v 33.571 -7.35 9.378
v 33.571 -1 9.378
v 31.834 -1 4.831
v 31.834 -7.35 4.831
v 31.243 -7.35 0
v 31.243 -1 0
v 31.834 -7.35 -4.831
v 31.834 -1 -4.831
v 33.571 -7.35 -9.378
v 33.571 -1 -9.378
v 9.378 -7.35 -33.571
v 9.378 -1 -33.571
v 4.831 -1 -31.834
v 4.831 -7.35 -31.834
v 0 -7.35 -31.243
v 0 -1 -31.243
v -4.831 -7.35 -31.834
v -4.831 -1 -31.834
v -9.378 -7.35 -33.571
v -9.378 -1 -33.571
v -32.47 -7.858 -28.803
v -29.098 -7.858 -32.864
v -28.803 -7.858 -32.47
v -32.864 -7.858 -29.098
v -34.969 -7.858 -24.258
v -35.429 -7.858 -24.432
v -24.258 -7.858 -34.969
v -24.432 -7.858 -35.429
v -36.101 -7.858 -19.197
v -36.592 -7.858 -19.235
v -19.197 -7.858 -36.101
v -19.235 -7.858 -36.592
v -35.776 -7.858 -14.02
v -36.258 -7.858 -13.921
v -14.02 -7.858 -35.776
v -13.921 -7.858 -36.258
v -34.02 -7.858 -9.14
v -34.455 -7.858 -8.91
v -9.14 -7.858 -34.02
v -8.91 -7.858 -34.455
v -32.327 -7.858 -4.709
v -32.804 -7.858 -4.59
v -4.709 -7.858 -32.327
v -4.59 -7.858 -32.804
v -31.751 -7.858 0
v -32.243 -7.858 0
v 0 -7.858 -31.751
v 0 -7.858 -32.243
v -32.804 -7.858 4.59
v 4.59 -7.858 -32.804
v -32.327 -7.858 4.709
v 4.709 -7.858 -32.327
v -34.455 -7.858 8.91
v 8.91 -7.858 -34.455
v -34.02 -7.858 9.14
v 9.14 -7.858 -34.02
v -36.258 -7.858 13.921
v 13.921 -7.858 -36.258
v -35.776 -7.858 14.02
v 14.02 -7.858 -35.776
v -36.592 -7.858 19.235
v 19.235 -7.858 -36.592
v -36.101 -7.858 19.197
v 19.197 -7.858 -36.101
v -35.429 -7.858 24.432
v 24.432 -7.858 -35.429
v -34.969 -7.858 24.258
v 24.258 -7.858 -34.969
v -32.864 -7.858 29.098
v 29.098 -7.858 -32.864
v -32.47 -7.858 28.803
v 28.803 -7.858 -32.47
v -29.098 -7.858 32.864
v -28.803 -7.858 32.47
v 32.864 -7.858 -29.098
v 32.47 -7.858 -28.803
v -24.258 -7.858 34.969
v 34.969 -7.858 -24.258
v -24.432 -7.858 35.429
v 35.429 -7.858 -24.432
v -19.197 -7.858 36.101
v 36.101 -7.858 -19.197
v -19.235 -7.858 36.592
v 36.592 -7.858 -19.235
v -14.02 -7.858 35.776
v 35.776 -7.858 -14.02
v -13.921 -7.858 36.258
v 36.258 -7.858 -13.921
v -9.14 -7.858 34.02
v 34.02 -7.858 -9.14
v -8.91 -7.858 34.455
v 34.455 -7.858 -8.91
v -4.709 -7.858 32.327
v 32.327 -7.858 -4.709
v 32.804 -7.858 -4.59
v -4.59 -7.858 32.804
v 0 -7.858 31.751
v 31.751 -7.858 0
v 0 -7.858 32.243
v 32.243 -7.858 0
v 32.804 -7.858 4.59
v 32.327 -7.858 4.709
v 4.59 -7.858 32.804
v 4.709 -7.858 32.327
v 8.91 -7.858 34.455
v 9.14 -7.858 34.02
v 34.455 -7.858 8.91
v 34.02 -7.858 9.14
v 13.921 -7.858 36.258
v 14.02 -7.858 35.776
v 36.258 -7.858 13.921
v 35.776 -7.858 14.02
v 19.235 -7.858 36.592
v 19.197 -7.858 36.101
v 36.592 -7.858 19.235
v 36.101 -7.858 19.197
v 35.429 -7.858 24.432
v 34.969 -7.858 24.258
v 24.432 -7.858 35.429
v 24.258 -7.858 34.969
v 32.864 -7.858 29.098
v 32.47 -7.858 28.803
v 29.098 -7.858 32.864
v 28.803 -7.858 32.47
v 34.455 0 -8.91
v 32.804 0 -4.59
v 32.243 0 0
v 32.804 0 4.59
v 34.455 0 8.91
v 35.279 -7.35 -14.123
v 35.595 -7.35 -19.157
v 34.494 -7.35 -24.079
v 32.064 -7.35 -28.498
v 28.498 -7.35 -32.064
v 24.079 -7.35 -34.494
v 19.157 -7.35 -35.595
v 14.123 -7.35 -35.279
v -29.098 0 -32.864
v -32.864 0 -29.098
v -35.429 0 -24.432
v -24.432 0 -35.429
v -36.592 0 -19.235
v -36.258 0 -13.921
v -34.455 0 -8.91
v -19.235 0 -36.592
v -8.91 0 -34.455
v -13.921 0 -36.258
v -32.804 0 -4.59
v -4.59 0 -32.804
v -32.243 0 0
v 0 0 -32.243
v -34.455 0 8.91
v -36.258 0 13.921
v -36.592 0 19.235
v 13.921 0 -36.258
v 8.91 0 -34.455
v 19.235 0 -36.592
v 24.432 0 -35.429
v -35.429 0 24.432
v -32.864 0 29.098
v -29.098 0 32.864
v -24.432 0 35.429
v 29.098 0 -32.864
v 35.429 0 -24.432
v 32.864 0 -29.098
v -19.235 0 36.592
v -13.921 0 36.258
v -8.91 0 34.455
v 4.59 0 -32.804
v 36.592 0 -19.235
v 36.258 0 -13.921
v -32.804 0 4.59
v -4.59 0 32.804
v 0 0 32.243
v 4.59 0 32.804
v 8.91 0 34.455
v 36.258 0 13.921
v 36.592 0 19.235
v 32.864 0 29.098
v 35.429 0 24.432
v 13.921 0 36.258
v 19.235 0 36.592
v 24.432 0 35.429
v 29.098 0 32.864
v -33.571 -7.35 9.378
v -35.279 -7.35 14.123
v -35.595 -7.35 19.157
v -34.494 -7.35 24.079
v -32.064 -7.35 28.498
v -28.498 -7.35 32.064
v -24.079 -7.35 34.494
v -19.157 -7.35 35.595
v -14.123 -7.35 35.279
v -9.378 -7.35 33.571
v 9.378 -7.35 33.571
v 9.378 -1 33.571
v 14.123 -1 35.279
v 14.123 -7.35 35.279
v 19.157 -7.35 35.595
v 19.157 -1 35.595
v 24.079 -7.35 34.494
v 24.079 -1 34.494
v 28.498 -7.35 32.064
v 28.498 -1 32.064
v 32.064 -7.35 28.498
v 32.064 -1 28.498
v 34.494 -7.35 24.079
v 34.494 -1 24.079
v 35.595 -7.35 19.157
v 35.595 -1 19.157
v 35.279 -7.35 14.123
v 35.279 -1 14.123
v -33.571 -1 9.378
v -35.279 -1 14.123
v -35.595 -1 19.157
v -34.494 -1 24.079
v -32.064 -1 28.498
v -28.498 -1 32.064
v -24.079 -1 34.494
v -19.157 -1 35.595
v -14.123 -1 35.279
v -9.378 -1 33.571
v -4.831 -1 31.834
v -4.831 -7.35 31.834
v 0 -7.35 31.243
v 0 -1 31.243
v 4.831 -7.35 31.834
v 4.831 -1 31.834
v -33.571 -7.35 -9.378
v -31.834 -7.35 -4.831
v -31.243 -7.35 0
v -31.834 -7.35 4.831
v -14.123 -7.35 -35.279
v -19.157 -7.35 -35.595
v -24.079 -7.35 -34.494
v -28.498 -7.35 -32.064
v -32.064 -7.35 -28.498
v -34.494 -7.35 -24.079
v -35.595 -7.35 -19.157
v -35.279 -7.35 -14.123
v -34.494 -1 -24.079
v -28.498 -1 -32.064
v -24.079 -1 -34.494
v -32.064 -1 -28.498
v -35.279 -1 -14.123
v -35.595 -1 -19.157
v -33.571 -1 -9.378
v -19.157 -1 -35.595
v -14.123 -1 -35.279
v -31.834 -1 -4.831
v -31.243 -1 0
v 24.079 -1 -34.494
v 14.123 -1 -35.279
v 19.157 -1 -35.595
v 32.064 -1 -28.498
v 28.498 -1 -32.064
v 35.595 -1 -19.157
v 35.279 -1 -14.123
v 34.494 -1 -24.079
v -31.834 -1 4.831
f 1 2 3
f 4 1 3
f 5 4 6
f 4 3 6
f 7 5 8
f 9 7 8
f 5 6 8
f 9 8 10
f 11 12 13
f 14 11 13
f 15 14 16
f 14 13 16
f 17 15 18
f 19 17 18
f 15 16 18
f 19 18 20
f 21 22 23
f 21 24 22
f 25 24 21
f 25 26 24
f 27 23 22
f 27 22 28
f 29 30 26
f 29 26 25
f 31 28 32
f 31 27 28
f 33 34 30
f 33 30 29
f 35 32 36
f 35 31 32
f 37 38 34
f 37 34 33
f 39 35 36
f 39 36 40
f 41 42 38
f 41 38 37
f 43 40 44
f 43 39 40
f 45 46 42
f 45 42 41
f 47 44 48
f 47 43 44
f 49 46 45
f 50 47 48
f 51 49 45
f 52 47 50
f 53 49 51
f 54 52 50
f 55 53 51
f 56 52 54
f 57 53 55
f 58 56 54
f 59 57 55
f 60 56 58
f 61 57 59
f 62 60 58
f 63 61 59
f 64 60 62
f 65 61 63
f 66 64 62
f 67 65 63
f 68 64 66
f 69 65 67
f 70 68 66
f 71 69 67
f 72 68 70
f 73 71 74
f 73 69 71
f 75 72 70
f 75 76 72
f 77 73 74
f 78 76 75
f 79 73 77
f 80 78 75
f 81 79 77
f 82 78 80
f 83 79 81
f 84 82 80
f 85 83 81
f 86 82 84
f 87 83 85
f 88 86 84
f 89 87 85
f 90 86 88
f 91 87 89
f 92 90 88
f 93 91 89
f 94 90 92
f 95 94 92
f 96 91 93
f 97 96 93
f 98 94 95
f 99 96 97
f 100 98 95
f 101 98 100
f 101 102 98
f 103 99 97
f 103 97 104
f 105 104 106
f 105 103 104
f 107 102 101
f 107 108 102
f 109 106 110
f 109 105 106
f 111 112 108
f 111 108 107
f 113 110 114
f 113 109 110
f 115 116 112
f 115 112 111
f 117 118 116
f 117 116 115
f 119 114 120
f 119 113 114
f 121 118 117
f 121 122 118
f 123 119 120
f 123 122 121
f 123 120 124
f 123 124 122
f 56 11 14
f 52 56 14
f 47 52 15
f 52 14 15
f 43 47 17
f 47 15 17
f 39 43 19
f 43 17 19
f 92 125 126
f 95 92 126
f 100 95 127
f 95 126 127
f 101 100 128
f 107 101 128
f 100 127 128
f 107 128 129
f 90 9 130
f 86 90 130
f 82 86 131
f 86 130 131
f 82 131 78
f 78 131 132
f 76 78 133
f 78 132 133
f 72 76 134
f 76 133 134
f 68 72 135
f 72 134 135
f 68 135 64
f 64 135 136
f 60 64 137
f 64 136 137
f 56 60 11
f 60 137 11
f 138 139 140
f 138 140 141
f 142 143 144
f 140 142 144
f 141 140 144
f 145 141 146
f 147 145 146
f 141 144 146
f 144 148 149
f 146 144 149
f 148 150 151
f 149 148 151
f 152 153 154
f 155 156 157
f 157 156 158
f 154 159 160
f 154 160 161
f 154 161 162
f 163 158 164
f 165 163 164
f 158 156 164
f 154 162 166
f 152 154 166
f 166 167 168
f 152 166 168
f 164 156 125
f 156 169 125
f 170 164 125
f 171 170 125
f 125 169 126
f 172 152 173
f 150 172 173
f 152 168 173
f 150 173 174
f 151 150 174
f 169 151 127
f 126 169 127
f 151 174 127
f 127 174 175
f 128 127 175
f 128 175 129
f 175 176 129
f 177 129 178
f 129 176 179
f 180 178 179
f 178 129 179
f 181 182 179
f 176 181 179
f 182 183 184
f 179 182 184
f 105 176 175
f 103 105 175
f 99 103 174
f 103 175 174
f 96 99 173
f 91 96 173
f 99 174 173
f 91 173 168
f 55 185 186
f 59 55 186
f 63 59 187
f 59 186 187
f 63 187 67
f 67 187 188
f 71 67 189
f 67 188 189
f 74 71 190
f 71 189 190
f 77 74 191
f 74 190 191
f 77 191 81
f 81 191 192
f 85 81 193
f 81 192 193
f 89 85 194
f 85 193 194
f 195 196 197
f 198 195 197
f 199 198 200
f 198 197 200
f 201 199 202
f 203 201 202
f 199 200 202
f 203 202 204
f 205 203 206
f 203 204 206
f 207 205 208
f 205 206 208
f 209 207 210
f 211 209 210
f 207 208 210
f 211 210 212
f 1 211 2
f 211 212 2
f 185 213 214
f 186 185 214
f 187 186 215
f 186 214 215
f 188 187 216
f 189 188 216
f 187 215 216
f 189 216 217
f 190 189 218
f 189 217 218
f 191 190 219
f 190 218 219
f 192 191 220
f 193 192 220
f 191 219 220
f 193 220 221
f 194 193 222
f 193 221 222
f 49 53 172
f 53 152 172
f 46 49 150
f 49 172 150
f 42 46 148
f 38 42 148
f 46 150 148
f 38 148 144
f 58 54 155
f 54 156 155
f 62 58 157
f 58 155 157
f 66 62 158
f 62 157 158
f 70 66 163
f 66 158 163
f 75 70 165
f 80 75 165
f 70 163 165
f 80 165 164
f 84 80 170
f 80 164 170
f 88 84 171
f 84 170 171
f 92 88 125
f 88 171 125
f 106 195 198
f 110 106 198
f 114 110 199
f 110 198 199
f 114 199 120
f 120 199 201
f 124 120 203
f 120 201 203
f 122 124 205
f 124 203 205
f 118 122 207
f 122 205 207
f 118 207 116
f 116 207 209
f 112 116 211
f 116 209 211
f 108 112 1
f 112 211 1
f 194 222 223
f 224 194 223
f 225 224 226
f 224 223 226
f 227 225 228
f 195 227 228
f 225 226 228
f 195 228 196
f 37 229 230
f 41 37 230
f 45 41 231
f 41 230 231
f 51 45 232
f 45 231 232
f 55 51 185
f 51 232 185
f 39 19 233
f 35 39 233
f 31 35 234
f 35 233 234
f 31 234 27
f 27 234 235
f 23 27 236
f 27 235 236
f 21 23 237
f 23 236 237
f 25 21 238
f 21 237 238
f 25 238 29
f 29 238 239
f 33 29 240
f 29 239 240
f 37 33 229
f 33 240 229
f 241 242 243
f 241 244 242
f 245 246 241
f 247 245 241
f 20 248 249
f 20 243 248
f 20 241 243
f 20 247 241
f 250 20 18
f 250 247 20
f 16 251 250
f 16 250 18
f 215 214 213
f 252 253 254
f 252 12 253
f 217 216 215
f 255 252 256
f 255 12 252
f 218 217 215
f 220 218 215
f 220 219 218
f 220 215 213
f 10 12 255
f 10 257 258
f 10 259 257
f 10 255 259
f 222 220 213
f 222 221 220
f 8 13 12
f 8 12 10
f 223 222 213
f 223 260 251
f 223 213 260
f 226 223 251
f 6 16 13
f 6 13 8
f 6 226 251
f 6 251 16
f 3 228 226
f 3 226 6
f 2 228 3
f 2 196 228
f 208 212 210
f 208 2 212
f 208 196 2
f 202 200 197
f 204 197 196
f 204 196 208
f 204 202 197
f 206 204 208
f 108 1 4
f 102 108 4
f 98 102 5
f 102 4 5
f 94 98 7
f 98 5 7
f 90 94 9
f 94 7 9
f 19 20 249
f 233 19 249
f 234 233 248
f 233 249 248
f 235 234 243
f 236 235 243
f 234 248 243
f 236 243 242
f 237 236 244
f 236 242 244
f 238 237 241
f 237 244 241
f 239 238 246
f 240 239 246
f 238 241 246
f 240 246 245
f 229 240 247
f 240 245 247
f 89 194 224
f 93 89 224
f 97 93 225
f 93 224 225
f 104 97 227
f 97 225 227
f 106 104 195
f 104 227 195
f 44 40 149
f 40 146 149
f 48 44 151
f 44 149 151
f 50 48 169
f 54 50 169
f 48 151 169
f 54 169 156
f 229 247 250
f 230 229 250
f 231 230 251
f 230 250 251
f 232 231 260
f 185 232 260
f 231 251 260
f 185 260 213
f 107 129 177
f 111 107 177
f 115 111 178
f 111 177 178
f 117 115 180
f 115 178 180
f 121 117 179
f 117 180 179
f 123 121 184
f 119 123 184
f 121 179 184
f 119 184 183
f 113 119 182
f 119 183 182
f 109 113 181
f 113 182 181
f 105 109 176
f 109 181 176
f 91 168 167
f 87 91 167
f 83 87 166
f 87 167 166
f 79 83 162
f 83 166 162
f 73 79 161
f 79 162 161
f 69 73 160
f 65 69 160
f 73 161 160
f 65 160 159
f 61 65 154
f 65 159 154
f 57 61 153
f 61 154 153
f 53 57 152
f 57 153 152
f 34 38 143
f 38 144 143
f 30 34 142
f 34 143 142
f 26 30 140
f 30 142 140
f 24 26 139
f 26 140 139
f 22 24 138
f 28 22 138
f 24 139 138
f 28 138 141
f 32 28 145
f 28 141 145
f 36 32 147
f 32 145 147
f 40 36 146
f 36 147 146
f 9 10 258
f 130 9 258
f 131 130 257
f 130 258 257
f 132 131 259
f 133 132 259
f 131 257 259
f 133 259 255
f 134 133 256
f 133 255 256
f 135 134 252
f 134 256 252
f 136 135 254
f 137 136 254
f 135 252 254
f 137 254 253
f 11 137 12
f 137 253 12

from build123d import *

# Parameters (mm, degrees)
F1_DEPTH = 1
F3_DEPTH = 6.858
F4_SIZE  = 0.508


with BuildPart() as f1:
    # F0 (on Front) → F1 (new body)
    with BuildSketch(Plane.XZ):
        with BuildLine():
            ThreePointArc((-8.910079, 34.455263), (-31.114318, 31.114318), (-34.455263, 8.910079))
            ThreePointArc((-34.455263, 8.910079), (-32.243107, 0), (-34.455263, -8.910079))
            ThreePointArc((-34.455263, -8.910079), (-31.114318, -31.114318), (-8.910079, -34.455263))
            ThreePointArc((-8.910079, -34.455263), (0, -32.243107), (8.910079, -34.455263))
            ThreePointArc((8.910079, -34.455263), (31.114318, -31.114318), (34.455263, -8.910079))
            ThreePointArc((34.455263, -8.910079), (32.243107, 0), (34.455263, 8.910079))
            ThreePointArc((34.455263, 8.910079), (31.114318, 31.114318), (8.910079, 34.455263))
            ThreePointArc((8.910079, 34.455263), (0, 32.243107), (-8.910079, 34.455263))
        make_face()
    extrude(amount=F1_DEPTH)

    # F2 (on face) → F3 (join)
    with BuildSketch(Plane.XZ.offset(1)):
        with BuildLine():
            ThreePointArc((-8.910079, 34.455263), (-31.114318, 31.114318), (-34.455263, 8.910079))
            ThreePointArc((-34.455263, 8.910079), (-32.243107, 0), (-34.455263, -8.910079))
            ThreePointArc((-34.455263, -8.910079), (-31.114318, -31.114318), (-8.910079, -34.455263))
            ThreePointArc((-8.910079, -34.455263), (0, -32.243107), (8.910079, -34.455263))
            ThreePointArc((8.910079, -34.455263), (31.114318, -31.114318), (34.455263, -8.910079))
            ThreePointArc((34.455263, -8.910079), (32.243107, 0), (34.455263, 8.910079))
            ThreePointArc((34.455263, 8.910079), (31.114318, 31.114318), (8.910079, 34.455263))
            ThreePointArc((8.910079, 34.455263), (0, 32.243107), (-8.910079, 34.455263))
        make_face()
        with BuildLine():
            ThreePointArc((-33.571386, -9.3778), (-31.243107, 0), (-33.571386, 9.3778))
            ThreePointArc((-33.571386, 9.3778), (-30.407211, 30.407211), (-9.3778, 33.571386))
            ThreePointArc((-9.3778, 33.571386), (0, 31.243107), (9.3778, 33.571386))
            ThreePointArc((9.3778, 33.571386), (30.407211, 30.407211), (33.571386, 9.3778))
            ThreePointArc((33.571386, 9.3778), (31.243107, 0), (33.571386, -9.3778))
            ThreePointArc((33.571386, -9.3778), (30.407211, -30.407211), (9.3778, -33.571386))
            ThreePointArc((9.3778, -33.571386), (0, -31.243107), (-9.3778, -33.571386))
            ThreePointArc((-9.3778, -33.571386), (-30.407211, -30.407211), (-33.571386, -9.3778))
        make_face(mode=Mode.SUBTRACT)
    extrude(amount=F3_DEPTH)

    # F4
    f4_edges = [f1.edges().sort_by_distance(p)[0] for p in [
        (-30.407211, -7.858, 30.407211),
    ]]
    chamfer(f4_edges, length=F4_SIZE)


solid = f1.part
